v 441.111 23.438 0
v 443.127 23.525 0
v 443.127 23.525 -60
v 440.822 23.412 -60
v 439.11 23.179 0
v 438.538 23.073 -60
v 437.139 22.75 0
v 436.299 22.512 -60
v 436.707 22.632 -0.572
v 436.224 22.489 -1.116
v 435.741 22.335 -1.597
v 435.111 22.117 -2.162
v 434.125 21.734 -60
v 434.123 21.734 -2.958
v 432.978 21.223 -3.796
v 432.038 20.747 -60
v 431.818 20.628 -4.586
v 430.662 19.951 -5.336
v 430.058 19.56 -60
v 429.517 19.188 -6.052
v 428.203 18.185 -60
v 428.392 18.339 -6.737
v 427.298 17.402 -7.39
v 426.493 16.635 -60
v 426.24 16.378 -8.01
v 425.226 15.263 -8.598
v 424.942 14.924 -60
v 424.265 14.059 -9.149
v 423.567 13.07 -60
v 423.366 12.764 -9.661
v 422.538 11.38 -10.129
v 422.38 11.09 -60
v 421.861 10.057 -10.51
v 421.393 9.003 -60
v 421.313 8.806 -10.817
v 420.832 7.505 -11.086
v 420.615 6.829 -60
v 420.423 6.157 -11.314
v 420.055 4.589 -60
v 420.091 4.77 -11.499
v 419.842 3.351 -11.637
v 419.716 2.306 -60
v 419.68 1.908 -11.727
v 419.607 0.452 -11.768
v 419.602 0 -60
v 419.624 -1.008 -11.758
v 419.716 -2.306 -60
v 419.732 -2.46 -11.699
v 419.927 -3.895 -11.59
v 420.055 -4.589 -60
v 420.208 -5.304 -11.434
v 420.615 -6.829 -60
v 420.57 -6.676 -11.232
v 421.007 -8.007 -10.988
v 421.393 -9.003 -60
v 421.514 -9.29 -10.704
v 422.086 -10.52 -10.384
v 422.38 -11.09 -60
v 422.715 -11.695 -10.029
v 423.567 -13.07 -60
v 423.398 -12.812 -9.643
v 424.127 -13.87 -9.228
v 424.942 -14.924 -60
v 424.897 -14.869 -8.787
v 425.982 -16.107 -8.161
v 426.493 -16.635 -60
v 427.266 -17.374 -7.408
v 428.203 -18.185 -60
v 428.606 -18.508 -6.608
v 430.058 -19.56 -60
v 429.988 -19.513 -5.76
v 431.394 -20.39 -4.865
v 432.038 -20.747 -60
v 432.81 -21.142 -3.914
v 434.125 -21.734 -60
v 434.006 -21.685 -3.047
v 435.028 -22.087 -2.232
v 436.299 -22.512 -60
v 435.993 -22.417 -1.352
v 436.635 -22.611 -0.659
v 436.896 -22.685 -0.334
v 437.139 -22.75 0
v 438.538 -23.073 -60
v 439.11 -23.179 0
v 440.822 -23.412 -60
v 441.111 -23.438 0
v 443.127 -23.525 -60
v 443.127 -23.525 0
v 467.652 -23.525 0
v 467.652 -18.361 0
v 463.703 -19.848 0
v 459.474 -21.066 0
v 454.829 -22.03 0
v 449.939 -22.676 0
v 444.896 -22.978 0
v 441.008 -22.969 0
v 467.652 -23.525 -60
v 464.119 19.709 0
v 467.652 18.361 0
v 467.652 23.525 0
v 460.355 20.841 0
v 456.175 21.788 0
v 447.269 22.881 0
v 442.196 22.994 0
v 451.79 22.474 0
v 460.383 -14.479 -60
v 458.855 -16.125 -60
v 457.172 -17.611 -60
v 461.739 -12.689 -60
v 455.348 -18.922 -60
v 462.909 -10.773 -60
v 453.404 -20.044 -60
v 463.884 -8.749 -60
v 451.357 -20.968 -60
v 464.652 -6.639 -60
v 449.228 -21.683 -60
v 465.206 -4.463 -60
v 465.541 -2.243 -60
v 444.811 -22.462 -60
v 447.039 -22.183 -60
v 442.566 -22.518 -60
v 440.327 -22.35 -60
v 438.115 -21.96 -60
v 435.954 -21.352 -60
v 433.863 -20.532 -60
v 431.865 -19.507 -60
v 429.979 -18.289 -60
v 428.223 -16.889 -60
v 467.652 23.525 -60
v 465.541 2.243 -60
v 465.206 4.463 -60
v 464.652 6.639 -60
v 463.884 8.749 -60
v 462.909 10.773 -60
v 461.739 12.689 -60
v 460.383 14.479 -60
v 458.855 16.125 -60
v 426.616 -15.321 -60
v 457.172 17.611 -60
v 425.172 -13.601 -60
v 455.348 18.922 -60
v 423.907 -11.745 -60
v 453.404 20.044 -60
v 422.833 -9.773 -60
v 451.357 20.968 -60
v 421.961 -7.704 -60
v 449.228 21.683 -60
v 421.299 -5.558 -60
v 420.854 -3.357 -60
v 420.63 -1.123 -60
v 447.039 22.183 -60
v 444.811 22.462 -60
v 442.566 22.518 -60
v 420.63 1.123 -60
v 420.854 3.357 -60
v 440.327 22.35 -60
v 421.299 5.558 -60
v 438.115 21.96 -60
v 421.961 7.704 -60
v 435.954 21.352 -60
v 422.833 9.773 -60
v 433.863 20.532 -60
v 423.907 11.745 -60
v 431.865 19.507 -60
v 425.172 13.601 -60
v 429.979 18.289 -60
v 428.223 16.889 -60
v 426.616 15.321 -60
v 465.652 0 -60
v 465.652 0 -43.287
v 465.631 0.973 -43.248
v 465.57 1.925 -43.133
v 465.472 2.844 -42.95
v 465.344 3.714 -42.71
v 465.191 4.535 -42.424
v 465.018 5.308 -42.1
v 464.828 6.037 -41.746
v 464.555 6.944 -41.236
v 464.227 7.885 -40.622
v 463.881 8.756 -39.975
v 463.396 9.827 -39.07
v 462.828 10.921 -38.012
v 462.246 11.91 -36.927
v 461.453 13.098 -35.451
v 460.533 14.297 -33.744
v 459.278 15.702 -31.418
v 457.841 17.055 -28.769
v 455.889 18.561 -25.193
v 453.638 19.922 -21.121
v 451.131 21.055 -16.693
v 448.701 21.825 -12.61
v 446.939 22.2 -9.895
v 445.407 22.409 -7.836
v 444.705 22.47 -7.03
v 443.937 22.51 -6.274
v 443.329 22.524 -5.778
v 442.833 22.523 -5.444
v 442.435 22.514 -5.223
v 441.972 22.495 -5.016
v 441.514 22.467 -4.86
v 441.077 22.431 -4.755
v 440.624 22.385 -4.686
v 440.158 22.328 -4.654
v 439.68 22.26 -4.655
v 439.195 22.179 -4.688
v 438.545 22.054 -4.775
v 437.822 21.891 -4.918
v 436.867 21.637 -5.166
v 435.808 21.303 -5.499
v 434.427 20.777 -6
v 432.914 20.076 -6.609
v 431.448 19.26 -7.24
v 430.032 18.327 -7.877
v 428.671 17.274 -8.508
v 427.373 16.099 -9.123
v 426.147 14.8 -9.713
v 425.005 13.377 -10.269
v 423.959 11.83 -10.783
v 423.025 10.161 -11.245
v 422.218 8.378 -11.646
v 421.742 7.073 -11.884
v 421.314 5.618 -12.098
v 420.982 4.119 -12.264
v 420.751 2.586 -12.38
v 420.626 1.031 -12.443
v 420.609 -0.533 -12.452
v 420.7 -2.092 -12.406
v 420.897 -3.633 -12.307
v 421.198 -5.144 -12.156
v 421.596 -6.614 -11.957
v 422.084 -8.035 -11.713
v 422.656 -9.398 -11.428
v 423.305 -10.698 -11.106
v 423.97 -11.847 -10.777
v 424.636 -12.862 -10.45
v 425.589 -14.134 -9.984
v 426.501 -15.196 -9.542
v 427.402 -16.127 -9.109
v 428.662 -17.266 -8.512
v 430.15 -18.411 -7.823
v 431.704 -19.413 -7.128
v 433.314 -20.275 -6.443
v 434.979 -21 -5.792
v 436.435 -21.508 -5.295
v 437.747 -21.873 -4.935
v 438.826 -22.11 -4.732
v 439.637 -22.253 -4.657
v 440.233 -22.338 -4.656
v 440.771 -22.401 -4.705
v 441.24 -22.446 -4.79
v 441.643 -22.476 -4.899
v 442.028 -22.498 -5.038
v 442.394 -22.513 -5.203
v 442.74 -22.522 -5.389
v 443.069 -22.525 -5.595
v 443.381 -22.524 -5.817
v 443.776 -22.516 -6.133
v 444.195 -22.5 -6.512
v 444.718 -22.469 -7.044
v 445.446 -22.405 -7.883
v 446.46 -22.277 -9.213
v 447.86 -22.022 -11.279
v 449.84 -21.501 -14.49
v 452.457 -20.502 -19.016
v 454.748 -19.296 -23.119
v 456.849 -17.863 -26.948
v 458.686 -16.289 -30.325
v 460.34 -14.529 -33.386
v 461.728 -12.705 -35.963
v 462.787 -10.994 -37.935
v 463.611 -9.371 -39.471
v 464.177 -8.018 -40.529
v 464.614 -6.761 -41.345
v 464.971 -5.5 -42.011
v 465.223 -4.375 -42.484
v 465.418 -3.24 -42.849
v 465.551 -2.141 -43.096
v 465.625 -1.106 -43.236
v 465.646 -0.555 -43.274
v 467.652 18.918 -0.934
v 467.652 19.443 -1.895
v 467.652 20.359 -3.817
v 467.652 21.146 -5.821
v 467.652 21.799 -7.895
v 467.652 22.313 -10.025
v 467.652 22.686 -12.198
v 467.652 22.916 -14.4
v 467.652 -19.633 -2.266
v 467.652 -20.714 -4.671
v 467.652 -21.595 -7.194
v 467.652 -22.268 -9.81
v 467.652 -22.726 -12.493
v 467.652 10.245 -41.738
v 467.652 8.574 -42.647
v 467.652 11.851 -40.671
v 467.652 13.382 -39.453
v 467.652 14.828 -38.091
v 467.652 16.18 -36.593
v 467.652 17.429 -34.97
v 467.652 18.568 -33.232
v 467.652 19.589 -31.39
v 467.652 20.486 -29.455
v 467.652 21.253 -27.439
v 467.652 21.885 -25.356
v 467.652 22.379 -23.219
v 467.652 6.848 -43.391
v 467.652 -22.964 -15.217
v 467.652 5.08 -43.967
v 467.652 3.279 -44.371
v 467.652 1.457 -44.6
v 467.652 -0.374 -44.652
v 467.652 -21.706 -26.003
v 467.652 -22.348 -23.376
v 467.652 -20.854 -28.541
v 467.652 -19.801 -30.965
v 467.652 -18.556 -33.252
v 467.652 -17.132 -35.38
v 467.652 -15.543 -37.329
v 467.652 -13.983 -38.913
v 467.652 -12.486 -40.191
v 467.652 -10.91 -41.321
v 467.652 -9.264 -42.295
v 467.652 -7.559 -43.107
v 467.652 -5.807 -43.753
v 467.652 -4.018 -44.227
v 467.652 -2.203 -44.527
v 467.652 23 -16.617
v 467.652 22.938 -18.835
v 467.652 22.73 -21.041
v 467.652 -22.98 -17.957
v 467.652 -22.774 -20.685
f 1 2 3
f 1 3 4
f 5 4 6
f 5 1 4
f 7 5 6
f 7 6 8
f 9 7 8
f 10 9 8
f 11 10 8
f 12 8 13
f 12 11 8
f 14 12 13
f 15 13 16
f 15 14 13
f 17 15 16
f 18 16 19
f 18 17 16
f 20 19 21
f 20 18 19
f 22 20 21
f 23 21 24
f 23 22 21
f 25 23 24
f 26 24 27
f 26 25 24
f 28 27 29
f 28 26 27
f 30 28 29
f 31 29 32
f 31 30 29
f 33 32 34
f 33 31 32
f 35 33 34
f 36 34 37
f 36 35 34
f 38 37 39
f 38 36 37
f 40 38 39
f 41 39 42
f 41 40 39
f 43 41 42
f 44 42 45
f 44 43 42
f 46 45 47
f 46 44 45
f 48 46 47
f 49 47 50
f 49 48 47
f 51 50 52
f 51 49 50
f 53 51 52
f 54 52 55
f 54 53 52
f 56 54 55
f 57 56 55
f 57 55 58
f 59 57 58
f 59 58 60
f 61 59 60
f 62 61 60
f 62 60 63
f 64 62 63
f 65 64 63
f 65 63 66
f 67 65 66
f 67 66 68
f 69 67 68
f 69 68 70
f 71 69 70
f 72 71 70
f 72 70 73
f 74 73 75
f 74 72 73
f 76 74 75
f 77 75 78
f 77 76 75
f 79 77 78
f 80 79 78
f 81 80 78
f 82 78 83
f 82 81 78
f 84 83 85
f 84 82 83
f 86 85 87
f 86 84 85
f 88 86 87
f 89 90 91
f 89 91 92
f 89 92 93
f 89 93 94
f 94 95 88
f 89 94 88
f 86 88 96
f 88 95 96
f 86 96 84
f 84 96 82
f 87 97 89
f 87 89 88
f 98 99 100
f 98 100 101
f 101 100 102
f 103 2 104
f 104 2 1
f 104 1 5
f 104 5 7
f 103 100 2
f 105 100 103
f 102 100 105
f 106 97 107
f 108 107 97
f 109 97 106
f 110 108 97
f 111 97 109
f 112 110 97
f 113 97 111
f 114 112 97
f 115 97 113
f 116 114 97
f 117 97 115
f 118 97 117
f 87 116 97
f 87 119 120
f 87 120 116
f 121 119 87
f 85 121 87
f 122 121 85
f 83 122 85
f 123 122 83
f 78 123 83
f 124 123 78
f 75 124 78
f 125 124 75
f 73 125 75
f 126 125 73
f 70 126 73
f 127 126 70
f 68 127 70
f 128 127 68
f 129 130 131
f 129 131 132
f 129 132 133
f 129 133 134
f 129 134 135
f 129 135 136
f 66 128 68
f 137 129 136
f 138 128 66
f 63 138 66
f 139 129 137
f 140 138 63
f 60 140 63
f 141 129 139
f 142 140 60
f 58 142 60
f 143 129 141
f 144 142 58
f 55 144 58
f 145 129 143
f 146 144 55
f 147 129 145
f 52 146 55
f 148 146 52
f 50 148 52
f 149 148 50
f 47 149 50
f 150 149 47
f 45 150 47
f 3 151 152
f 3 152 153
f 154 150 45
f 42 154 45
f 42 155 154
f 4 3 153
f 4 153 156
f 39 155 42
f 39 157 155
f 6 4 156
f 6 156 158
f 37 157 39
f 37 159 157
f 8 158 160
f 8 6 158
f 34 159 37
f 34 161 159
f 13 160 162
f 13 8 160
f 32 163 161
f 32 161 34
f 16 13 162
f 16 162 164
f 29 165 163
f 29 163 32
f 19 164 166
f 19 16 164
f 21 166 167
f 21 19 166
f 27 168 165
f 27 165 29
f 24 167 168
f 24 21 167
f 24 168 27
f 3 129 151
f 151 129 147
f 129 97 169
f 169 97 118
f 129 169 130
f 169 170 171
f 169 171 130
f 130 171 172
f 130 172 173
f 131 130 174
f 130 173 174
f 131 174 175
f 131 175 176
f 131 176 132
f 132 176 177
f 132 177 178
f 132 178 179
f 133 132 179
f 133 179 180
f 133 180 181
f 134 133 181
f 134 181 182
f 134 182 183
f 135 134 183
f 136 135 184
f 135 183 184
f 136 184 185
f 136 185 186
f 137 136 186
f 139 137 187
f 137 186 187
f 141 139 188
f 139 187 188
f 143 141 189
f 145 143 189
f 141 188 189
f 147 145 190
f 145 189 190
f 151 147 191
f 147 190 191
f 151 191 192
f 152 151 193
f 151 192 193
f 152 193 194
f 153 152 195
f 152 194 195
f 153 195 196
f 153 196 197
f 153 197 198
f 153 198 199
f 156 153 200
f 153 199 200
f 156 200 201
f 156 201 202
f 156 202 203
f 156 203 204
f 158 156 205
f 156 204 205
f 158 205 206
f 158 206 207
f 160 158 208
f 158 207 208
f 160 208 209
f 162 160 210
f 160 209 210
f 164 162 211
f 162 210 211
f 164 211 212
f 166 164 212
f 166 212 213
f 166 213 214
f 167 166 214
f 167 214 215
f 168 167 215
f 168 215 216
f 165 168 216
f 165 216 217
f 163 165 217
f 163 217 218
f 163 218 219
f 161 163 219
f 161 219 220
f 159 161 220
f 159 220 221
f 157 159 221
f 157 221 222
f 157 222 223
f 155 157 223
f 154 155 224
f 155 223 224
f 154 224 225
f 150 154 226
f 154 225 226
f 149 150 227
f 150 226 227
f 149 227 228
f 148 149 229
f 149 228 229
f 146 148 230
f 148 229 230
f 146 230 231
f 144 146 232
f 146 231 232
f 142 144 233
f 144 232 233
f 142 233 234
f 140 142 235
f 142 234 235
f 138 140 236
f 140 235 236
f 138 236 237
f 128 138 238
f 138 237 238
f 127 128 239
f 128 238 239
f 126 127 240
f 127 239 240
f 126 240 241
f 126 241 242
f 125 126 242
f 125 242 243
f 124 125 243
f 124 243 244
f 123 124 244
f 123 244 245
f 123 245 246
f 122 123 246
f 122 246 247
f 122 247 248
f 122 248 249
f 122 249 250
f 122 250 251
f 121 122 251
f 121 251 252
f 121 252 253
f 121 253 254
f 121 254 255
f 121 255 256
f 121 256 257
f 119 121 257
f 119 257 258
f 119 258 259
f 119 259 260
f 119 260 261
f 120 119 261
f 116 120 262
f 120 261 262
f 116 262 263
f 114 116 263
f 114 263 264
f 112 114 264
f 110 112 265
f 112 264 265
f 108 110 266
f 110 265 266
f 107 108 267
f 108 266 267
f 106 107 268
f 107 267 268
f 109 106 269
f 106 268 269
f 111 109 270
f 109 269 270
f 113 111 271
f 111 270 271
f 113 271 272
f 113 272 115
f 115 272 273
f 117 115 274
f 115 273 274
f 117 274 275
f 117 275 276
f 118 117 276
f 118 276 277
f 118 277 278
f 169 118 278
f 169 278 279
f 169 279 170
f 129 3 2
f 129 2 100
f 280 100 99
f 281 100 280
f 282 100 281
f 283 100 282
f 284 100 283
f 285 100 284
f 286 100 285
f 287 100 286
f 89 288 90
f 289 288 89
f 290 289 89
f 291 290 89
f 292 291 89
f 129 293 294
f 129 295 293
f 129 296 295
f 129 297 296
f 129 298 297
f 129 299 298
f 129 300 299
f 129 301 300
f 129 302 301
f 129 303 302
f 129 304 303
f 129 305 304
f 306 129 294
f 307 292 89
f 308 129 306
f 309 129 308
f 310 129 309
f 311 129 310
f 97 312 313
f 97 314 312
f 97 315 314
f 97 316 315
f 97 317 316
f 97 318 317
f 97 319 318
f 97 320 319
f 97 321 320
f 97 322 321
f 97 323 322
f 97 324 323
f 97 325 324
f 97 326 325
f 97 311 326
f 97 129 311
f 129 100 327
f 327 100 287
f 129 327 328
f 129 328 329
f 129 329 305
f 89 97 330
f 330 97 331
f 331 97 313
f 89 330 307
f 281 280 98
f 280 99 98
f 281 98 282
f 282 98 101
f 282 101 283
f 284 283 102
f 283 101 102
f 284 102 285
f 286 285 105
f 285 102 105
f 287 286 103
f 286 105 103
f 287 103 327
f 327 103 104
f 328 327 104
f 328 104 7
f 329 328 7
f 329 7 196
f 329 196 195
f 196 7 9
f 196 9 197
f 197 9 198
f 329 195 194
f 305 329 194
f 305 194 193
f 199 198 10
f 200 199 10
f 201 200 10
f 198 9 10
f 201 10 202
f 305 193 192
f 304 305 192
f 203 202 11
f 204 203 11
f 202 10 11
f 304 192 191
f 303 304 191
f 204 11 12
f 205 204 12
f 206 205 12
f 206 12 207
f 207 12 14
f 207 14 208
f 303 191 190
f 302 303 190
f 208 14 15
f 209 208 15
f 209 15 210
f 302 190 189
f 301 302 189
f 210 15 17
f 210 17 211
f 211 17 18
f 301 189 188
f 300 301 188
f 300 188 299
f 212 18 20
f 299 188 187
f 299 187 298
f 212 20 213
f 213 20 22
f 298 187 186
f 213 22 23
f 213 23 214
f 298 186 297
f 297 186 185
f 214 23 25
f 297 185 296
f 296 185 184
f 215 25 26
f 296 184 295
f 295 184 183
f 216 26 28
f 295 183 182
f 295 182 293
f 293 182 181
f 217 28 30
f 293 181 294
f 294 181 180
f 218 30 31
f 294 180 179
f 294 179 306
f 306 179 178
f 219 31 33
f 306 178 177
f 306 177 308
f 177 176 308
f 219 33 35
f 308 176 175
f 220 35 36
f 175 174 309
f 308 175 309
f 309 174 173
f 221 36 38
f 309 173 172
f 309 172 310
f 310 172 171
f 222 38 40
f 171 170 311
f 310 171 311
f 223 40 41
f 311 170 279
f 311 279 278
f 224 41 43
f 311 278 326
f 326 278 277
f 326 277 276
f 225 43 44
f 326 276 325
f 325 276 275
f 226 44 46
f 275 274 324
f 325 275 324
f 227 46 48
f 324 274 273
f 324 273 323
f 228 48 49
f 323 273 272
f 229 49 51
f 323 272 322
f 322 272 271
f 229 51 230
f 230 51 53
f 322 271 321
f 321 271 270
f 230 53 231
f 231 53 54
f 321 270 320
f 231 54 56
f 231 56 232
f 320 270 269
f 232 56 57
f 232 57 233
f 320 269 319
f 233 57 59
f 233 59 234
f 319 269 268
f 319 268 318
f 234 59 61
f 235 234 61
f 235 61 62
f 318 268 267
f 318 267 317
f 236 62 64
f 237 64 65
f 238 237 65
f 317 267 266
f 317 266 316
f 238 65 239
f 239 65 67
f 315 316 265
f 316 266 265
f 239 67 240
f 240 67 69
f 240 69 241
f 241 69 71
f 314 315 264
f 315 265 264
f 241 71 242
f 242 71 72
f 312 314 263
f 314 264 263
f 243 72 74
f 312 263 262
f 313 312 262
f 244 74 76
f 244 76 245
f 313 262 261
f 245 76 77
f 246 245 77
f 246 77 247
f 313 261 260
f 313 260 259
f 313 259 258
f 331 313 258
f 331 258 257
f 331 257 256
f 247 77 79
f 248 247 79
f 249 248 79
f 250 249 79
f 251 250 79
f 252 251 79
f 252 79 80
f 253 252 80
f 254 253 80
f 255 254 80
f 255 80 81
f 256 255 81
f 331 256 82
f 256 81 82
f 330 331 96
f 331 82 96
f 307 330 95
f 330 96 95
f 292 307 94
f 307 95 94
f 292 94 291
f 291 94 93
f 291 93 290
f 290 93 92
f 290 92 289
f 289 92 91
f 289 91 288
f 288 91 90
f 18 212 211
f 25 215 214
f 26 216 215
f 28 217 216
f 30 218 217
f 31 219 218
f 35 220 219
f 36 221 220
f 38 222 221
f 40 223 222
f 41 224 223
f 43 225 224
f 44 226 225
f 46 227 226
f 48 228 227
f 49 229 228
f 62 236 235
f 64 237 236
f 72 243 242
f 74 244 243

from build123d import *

# Parameters (mm, degrees)
SKETCH1_R           = 23.525
SKETCH1_R_2         = 22.525
BOSS_EXTRUDE1_DEPTH = 60
BOSS_EXTRUDE2_DEPTH = 60
SKETCH2_R           = 23
CUT_EXTRUDE1_DEPTH  = 112.626209254


with BuildPart() as part:
    # Sketch1 → Boss-Extrude1 (new body)
    with BuildSketch(Plane.XY):
        with Locations((443.127496957, 0)):
            Circle(SKETCH1_R)
        with Locations((443.127496957, 0)):
            Circle(SKETCH1_R_2, mode=Mode.SUBTRACT)
    extrude(amount=-BOSS_EXTRUDE1_DEPTH)

    # Sketch3 → Boss-Extrude2 (add)
    with BuildSketch(Plane(origin=(0, 0, -60), x_dir=(-1, 0, 0), z_dir=(0, 0, -1))):
        with BuildLine():
            Line((-466.652496957, -23.525), (-443.127496957, -23.525))
            ThreePointArc((-443.127496957, -23.525), (-459.762183984, -16.634687027), (-466.652496957, 0))
            Line((-466.652496957, 0), (-466.652496957, -23.525))
        make_face()
        Polygon((-466.652496957, 23.525), (-467.652496957, 23.525), (-467.652496957, -23.525), (-466.652496957, -23.525), (-466.652496957, 0), align=None)
        with BuildLine():
            Line((-466.652496957, 23.525), (-466.652496957, 0))
            ThreePointArc((-466.652496957, 0), (-459.762183984, 16.634687027), (-443.127496957, 23.525))
            Line((-443.127496957, 23.525), (-466.652496957, 23.525))
        make_face()
    extrude(amount=-BOSS_EXTRUDE2_DEPTH)

    # Sketch2 → Cut-Extrude1 (cut, through all)
    with BuildSketch(Plane(origin=(254.325020267, 0, -174.059113982), x_dir=(0.564788358, 0, 0.825235791), z_dir=(-0.825235791, 0, 0.564788358))):
        with Locations((250.273251396, 0)):
            Circle(SKETCH2_R)
    extrude(amount=-CUT_EXTRUDE1_DEPTH, mode=Mode.SUBTRACT)


solid = part.part
